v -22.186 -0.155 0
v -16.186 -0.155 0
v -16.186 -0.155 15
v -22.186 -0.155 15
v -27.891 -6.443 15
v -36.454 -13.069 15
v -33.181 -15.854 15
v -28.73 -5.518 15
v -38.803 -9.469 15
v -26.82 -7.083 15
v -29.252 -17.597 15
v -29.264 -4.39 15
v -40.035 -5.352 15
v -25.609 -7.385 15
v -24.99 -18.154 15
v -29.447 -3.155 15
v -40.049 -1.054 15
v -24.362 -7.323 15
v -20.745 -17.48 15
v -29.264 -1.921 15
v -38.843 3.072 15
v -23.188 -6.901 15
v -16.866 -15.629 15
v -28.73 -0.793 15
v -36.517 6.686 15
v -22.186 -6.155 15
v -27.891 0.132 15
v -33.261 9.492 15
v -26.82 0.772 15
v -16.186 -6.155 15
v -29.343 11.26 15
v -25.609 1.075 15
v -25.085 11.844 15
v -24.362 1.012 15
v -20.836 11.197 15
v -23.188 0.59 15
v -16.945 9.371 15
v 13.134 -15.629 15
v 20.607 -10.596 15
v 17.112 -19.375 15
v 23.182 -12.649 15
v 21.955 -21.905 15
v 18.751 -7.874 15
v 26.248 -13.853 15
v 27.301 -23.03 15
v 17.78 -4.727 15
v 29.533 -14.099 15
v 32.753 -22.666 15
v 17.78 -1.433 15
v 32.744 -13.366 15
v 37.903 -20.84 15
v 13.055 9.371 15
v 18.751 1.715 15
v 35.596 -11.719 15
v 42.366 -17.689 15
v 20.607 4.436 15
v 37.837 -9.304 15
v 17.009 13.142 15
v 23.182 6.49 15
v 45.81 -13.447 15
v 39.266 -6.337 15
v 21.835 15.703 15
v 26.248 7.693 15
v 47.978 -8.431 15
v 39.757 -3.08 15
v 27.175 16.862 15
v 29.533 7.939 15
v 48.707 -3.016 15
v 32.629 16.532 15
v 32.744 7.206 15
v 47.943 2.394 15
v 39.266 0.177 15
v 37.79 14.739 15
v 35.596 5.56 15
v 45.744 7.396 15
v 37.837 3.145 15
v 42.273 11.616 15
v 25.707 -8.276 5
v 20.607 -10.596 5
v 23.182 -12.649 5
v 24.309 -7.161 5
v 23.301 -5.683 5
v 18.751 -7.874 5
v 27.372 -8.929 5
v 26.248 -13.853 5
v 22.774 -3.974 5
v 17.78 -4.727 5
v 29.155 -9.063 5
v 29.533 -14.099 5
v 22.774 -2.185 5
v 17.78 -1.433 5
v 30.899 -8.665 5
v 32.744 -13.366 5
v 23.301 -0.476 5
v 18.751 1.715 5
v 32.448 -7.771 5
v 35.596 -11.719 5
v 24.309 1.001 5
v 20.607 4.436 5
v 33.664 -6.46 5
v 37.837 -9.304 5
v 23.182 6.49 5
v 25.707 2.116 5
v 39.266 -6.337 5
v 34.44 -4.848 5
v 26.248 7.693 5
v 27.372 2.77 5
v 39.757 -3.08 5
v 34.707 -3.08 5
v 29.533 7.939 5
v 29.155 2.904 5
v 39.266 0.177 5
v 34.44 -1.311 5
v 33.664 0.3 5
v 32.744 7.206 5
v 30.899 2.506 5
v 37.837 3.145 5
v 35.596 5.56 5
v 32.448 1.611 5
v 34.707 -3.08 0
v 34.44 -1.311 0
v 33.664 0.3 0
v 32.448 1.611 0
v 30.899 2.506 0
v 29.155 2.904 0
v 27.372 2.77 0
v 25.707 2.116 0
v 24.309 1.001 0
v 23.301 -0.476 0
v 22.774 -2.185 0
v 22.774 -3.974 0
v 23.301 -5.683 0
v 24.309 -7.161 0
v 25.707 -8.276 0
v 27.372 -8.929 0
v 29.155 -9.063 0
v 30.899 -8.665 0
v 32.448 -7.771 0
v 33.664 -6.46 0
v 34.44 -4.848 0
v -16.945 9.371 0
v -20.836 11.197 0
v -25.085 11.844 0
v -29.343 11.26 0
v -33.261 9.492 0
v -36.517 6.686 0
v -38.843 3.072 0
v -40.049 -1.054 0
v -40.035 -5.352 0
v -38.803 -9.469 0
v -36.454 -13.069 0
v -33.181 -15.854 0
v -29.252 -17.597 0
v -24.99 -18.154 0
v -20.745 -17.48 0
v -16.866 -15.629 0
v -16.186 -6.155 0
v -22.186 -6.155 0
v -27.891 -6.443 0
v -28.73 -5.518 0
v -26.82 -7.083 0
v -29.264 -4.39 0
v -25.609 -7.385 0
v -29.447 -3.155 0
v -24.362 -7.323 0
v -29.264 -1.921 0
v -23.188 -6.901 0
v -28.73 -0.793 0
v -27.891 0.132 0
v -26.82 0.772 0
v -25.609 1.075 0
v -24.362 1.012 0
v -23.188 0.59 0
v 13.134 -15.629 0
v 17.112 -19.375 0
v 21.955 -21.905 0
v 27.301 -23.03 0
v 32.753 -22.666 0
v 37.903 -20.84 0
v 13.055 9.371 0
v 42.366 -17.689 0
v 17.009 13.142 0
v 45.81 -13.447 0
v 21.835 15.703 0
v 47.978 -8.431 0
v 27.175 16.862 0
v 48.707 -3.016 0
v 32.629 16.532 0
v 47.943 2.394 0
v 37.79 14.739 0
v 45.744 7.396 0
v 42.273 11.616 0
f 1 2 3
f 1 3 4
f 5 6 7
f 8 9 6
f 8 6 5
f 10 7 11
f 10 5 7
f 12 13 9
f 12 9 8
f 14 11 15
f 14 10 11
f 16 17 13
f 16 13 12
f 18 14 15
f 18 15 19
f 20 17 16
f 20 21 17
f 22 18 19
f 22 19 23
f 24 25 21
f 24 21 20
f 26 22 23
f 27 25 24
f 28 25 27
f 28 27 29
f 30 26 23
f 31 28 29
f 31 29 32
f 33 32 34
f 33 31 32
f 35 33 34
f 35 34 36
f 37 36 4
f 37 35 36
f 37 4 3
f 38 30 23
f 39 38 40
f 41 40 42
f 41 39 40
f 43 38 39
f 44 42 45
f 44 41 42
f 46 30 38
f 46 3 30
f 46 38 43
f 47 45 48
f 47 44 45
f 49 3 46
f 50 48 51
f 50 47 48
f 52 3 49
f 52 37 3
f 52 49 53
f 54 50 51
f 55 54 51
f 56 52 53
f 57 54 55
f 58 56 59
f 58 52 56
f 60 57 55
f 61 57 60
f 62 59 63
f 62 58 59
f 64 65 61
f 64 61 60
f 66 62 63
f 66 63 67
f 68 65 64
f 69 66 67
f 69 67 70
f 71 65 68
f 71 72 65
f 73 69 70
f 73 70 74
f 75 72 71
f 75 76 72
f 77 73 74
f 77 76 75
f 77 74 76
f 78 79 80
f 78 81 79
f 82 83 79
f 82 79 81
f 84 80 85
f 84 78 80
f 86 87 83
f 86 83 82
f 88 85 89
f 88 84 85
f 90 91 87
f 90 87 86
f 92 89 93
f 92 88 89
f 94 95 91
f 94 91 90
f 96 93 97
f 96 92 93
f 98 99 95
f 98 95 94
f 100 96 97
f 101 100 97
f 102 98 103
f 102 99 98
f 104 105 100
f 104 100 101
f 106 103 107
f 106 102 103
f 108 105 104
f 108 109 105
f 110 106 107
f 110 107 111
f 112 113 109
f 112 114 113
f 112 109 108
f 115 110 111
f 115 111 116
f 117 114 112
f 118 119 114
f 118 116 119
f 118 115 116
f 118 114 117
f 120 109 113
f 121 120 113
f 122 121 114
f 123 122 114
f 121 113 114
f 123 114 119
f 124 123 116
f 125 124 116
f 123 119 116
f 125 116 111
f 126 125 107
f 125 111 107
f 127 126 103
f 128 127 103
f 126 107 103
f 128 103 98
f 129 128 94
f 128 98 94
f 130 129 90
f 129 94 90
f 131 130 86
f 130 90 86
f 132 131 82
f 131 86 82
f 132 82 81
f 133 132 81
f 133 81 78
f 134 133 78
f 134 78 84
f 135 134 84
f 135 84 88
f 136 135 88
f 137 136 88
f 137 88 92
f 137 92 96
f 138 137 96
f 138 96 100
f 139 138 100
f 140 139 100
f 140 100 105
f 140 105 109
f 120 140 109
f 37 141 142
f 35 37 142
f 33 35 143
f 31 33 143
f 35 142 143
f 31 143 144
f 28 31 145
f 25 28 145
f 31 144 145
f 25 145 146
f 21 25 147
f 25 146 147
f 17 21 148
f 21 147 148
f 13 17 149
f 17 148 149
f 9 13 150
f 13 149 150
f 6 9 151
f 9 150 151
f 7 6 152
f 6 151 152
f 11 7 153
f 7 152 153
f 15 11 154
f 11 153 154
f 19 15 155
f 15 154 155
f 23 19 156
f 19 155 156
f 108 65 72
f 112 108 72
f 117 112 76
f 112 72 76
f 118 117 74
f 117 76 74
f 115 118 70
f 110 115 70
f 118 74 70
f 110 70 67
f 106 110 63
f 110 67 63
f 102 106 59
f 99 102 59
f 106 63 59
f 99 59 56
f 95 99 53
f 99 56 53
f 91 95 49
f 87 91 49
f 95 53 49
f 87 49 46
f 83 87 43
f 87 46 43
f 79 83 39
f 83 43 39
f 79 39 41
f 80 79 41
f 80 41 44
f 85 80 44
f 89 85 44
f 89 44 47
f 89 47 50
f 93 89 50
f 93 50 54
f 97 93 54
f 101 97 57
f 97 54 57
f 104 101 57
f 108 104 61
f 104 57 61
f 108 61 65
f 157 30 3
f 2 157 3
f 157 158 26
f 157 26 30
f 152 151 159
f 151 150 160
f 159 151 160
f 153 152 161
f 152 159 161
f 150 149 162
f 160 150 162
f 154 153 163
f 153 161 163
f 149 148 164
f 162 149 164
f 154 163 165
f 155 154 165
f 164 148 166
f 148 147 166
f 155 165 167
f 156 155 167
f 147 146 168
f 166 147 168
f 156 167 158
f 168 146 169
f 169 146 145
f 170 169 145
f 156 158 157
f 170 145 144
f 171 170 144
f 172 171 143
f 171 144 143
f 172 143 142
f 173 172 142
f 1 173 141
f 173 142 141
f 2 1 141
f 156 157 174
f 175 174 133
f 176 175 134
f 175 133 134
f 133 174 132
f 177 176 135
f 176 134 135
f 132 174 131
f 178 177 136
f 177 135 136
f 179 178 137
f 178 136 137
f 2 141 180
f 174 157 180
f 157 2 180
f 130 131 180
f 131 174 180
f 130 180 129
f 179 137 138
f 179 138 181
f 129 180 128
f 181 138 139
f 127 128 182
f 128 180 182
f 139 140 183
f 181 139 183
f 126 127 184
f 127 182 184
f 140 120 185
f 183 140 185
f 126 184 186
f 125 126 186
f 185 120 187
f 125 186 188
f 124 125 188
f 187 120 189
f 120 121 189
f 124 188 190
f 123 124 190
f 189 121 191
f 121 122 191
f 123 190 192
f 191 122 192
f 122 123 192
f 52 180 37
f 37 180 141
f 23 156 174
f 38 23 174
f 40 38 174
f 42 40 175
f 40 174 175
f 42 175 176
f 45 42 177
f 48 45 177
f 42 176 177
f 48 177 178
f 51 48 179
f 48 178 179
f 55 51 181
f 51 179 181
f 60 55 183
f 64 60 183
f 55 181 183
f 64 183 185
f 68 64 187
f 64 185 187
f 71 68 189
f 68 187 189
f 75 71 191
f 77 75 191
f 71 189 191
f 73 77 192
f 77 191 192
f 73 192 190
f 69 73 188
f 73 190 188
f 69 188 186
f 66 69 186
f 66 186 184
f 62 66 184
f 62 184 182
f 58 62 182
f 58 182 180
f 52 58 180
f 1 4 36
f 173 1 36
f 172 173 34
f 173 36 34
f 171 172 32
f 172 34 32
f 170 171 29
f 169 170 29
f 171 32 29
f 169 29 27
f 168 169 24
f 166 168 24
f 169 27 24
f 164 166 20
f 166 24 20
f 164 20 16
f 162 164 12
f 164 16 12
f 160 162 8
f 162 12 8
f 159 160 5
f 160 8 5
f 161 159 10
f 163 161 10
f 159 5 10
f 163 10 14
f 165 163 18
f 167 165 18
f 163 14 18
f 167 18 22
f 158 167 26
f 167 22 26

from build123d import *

# Parameters (mm, degrees)
SKETCH1_R           = 4.25
BOSS_EXTRUDE1_DEPTH = 15
SKETCH2_R           = 11.05
CUT_EXTRUDE1_DEPTH  = 10
SKETCH3_R           = 6
CUT_EXTRUDE2_DEPTH  = 10
CUT_EXTRUDE5_DEPTH  = 15


with BuildPart() as part:
    # Sketch1 → Boss-Extrude1 (new body)
    with BuildSketch(Plane.XY):
        with BuildLine():
            Line((-16.865782324, -15.62917697), (13.134217676, -15.62917697))
            ThreePointArc((13.134217676, -15.62917697), (48.706833622, -3.016216146), (13.054918576, 9.37082303))
            Line((13.054918576, 9.37082303), (-16.945081424, 9.37082303))
            ThreePointArc((-16.945081424, 9.37082303), (-40.196781878, -3.203056293), (-16.865782324, -15.62917697))
        make_face()
        with Locations((-25.196857337, -3.155477073)):
            Circle(SKETCH1_R, mode=Mode.SUBTRACT)
    extrude(amount=BOSS_EXTRUDE1_DEPTH)

    # Sketch2 → Cut-Extrude1 (cut)
    with BuildSketch(Plane.XY.offset(15)):
        with Locations((28.706934234, -3.079655107)):
            Circle(SKETCH2_R)
    extrude(amount=-CUT_EXTRUDE1_DEPTH, mode=Mode.SUBTRACT)

    # Sketch3 → Cut-Extrude2 (cut)
    with BuildSketch(Plane.XY.offset(5)):
        with Locations((28.706934234, -3.079655107)):
            Circle(SKETCH3_R)
    extrude(amount=-CUT_EXTRUDE2_DEPTH, mode=Mode.SUBTRACT)

    # Sketch5 → Cut-Extrude5 (cut)
    with BuildSketch(Plane.XY.offset(15)):
        with BuildLine():
            Line((-16.186458693, -0.155477073), (-22.186458693, -0.155477073))
            ThreePointArc((-22.186458693, -0.155477073), (-29.446857337, -3.155477073), (-22.186458693, -6.155477073))
            Line((-22.186458693, -6.155477073), (-16.186458693, -6.155477073))
            Line((-16.186458693, -6.155477073), (-16.186458693, -0.155477073))
        make_face()
    extrude(amount=-CUT_EXTRUDE5_DEPTH, mode=Mode.SUBTRACT)


solid = part.part
